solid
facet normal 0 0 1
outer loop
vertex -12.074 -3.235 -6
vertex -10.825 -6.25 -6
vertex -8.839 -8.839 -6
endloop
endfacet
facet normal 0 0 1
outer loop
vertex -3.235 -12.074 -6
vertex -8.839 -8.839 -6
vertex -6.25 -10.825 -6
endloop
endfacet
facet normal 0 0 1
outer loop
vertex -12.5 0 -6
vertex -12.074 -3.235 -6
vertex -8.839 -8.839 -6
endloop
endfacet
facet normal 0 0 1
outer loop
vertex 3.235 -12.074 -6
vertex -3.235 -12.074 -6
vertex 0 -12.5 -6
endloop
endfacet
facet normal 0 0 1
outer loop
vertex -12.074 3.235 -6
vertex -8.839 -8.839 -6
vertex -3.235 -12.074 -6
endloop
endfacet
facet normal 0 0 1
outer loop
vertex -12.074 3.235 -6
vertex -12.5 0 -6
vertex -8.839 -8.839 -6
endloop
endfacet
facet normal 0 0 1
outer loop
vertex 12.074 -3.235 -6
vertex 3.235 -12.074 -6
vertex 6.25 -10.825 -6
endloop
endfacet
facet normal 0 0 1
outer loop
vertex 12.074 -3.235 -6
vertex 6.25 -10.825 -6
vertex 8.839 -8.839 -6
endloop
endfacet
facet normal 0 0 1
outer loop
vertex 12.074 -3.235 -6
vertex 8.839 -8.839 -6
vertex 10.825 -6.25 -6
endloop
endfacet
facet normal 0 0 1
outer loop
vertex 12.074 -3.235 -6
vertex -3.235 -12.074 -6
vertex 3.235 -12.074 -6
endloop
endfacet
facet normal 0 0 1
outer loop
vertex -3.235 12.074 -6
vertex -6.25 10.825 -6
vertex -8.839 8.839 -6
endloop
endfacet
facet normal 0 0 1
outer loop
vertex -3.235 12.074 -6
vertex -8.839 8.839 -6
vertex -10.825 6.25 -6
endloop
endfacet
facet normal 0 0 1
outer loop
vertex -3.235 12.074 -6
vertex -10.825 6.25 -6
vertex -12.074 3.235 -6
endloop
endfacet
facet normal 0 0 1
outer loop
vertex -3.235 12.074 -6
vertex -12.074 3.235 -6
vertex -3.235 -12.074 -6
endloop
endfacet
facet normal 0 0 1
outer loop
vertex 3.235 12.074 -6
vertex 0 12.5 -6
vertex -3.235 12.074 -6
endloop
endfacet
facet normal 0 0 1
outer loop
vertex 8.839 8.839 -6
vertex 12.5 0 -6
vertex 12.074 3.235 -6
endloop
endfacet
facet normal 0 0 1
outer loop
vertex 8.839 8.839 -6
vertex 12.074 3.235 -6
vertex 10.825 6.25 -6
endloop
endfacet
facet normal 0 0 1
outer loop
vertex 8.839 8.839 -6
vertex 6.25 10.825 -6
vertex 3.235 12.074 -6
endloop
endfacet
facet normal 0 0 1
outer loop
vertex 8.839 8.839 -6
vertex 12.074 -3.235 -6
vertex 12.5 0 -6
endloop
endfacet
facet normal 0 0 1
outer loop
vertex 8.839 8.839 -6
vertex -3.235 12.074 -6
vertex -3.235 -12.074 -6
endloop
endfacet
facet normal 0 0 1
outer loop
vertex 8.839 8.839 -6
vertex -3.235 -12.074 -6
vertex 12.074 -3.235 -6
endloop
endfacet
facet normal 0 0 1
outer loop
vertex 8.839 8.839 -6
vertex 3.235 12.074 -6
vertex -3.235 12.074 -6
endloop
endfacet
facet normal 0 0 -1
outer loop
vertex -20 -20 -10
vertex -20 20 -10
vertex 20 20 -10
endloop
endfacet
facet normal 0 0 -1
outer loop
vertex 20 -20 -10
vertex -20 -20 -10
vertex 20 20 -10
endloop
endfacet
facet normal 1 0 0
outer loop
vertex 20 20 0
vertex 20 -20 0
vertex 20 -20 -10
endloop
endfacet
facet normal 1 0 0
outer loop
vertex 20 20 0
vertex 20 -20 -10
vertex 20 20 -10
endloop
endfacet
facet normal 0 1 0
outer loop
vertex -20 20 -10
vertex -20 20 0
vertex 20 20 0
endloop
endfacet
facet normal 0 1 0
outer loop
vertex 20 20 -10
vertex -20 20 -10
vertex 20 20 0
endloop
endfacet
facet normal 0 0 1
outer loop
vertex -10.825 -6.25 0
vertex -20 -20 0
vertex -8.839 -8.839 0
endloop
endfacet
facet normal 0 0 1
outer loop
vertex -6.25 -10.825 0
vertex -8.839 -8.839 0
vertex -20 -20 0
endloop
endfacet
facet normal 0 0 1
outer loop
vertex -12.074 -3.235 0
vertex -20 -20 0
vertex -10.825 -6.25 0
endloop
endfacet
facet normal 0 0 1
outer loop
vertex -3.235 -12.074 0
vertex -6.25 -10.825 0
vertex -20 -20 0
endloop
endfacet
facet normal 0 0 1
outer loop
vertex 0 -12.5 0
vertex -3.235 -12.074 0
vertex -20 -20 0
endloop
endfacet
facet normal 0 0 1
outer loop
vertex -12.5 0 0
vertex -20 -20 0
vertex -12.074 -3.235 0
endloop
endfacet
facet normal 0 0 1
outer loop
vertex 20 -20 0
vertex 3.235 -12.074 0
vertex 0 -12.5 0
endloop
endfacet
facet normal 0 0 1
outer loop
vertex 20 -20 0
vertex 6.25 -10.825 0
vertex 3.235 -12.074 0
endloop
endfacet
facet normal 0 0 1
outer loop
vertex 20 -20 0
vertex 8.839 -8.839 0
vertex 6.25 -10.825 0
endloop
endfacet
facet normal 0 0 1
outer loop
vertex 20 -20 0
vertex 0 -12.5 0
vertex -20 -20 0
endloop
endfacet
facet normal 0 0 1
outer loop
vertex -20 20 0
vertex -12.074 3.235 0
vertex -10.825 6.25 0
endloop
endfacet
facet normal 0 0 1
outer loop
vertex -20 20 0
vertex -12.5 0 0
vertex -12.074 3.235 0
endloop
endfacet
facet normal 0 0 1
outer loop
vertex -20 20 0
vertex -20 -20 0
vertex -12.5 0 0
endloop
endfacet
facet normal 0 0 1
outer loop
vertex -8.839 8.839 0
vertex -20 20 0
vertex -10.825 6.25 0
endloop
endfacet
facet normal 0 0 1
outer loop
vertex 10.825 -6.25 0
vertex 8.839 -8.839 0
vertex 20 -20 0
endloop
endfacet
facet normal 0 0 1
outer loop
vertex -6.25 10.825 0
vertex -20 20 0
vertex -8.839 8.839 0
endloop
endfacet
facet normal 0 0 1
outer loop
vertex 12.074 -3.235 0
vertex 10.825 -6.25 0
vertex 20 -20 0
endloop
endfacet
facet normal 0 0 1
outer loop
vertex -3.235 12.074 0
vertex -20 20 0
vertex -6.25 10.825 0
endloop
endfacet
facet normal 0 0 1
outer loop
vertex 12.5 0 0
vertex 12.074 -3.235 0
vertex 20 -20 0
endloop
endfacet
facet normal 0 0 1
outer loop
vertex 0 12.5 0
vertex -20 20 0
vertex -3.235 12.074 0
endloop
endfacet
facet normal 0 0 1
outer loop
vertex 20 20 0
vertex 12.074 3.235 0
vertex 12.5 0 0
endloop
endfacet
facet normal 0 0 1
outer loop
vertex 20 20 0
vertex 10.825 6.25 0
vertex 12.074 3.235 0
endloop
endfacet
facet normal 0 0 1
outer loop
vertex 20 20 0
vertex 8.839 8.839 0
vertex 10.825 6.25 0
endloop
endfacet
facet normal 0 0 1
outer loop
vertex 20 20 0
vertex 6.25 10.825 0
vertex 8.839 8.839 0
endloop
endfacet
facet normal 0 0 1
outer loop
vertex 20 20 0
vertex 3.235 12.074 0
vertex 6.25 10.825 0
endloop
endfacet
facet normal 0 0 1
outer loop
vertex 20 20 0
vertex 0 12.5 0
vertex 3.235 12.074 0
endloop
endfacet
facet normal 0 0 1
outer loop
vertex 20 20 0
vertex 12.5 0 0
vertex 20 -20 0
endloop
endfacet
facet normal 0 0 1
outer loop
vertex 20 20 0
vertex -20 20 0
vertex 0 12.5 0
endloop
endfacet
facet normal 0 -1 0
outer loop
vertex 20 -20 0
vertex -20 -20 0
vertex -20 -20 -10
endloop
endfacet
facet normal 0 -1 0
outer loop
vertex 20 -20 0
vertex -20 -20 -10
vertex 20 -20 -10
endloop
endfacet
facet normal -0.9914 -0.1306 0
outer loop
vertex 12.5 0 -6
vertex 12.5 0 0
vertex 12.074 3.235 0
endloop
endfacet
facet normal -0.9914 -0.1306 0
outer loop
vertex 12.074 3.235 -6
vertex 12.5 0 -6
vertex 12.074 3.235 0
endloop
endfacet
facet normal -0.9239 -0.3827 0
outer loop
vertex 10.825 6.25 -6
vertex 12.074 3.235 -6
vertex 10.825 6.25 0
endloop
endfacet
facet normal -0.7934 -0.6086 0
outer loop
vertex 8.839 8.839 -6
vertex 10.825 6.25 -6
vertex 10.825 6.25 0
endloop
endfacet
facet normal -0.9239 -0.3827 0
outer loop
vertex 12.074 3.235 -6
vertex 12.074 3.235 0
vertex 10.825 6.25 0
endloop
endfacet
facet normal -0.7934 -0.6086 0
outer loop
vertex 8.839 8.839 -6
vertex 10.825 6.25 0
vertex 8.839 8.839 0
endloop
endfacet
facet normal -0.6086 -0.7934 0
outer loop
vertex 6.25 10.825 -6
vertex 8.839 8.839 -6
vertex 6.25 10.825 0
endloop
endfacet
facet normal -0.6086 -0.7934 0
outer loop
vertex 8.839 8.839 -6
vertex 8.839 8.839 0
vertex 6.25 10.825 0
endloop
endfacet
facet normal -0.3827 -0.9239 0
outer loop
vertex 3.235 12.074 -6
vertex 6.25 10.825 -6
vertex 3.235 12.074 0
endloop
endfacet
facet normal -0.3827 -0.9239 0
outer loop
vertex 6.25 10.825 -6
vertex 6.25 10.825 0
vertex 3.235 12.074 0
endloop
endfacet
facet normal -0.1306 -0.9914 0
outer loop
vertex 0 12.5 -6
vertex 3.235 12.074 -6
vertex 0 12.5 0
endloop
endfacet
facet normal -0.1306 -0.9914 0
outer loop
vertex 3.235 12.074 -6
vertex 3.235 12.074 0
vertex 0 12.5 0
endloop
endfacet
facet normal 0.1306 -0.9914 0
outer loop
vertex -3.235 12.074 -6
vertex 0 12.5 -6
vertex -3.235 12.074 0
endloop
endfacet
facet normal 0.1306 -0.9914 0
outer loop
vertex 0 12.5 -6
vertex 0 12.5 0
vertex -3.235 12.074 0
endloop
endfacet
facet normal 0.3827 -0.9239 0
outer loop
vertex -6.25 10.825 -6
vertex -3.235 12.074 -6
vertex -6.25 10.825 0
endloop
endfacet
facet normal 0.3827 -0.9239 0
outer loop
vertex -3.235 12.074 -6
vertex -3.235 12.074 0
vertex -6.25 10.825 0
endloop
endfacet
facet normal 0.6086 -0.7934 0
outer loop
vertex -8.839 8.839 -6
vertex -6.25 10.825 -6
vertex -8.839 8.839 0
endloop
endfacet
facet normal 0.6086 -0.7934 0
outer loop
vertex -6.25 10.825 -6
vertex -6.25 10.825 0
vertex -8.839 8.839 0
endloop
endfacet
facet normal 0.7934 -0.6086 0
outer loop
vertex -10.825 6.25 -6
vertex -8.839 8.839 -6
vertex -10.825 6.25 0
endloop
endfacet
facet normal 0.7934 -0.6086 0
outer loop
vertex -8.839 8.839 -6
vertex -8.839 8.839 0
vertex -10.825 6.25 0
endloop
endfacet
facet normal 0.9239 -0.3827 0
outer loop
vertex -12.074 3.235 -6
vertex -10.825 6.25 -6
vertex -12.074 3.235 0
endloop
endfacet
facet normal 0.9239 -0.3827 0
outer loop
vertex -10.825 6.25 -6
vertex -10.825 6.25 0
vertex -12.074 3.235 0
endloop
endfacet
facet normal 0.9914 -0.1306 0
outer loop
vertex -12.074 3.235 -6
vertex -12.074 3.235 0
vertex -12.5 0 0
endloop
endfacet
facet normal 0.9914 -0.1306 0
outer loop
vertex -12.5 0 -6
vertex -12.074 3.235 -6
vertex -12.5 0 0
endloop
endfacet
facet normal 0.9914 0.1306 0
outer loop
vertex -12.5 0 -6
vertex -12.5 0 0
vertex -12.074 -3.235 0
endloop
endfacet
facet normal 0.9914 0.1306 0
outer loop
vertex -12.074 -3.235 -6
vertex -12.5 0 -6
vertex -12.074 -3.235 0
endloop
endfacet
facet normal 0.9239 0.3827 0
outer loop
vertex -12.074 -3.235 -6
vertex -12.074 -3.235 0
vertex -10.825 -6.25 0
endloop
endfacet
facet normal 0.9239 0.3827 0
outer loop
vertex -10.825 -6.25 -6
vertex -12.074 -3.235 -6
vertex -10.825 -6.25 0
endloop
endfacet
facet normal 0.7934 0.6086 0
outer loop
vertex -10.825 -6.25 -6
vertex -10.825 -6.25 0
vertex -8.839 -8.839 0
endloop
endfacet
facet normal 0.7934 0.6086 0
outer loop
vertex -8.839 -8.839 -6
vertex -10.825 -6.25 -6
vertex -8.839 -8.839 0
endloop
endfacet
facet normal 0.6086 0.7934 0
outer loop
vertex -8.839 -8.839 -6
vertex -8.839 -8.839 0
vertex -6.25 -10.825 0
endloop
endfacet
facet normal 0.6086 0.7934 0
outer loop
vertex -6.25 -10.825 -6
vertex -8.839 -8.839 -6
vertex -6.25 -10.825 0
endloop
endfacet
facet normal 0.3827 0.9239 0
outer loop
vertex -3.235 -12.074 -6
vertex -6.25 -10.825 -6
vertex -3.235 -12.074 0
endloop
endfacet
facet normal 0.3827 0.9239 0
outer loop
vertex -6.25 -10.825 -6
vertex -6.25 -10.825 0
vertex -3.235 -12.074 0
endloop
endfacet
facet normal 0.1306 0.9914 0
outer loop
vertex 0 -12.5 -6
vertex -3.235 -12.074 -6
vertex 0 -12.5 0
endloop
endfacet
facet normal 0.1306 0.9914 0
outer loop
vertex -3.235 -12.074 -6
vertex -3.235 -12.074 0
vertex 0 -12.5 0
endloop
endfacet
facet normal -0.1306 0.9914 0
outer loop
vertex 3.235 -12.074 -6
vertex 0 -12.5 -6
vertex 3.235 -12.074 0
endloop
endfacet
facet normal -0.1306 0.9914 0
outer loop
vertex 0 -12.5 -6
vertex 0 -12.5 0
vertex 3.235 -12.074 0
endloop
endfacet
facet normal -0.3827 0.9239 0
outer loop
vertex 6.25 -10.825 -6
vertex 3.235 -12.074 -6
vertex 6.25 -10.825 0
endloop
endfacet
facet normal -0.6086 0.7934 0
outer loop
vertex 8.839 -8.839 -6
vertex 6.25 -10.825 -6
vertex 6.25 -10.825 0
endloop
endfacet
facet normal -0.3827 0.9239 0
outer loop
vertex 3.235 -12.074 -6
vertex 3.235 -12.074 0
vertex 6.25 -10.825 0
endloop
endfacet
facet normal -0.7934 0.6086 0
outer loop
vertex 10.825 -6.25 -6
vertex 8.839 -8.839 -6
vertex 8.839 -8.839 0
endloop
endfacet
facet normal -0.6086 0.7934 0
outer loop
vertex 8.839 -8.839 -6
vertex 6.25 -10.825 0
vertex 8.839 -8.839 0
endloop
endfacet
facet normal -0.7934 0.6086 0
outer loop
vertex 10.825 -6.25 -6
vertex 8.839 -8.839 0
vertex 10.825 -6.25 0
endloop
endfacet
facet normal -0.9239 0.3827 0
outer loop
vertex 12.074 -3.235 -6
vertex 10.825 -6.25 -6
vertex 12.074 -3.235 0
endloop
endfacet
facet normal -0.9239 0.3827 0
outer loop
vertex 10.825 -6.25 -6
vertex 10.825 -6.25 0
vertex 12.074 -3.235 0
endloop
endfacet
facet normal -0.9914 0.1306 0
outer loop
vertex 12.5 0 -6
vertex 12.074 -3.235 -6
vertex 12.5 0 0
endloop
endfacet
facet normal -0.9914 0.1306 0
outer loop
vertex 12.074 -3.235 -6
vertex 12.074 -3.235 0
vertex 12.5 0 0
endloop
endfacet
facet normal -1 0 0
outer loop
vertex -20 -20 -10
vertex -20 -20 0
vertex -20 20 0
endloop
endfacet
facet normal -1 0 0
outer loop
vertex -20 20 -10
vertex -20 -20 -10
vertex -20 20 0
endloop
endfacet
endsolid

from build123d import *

# Parameters (mm, degrees)
SKETCH_W     = 40
SKETCH_H     = 40
PAD_DEPTH    = 10
SKETCH003_R  = 12.5
POCKET_DEPTH = 6


with BuildPart() as part:
    # Sketch → Pad (new body)
    with BuildSketch(Plane.XY):
        Rectangle(SKETCH_W, SKETCH_H)
    extrude(amount=-PAD_DEPTH)

    # Sketch001 → Groove (revolve, cut)
    with BuildSketch(Plane.XZ):
        Polygon((0, 0), (0, -5), (2.5, -3.249481), (2.5, 0), align=None)
    revolve(axis=Axis((0, 0, 0), (0, 0, 1)), mode=Mode.SUBTRACT)

    # Sketch003 → Pocket (cut)
    with BuildSketch(Plane.XY):
        Circle(SKETCH003_R)
    extrude(amount=-POCKET_DEPTH, mode=Mode.SUBTRACT)


solid = part.part
